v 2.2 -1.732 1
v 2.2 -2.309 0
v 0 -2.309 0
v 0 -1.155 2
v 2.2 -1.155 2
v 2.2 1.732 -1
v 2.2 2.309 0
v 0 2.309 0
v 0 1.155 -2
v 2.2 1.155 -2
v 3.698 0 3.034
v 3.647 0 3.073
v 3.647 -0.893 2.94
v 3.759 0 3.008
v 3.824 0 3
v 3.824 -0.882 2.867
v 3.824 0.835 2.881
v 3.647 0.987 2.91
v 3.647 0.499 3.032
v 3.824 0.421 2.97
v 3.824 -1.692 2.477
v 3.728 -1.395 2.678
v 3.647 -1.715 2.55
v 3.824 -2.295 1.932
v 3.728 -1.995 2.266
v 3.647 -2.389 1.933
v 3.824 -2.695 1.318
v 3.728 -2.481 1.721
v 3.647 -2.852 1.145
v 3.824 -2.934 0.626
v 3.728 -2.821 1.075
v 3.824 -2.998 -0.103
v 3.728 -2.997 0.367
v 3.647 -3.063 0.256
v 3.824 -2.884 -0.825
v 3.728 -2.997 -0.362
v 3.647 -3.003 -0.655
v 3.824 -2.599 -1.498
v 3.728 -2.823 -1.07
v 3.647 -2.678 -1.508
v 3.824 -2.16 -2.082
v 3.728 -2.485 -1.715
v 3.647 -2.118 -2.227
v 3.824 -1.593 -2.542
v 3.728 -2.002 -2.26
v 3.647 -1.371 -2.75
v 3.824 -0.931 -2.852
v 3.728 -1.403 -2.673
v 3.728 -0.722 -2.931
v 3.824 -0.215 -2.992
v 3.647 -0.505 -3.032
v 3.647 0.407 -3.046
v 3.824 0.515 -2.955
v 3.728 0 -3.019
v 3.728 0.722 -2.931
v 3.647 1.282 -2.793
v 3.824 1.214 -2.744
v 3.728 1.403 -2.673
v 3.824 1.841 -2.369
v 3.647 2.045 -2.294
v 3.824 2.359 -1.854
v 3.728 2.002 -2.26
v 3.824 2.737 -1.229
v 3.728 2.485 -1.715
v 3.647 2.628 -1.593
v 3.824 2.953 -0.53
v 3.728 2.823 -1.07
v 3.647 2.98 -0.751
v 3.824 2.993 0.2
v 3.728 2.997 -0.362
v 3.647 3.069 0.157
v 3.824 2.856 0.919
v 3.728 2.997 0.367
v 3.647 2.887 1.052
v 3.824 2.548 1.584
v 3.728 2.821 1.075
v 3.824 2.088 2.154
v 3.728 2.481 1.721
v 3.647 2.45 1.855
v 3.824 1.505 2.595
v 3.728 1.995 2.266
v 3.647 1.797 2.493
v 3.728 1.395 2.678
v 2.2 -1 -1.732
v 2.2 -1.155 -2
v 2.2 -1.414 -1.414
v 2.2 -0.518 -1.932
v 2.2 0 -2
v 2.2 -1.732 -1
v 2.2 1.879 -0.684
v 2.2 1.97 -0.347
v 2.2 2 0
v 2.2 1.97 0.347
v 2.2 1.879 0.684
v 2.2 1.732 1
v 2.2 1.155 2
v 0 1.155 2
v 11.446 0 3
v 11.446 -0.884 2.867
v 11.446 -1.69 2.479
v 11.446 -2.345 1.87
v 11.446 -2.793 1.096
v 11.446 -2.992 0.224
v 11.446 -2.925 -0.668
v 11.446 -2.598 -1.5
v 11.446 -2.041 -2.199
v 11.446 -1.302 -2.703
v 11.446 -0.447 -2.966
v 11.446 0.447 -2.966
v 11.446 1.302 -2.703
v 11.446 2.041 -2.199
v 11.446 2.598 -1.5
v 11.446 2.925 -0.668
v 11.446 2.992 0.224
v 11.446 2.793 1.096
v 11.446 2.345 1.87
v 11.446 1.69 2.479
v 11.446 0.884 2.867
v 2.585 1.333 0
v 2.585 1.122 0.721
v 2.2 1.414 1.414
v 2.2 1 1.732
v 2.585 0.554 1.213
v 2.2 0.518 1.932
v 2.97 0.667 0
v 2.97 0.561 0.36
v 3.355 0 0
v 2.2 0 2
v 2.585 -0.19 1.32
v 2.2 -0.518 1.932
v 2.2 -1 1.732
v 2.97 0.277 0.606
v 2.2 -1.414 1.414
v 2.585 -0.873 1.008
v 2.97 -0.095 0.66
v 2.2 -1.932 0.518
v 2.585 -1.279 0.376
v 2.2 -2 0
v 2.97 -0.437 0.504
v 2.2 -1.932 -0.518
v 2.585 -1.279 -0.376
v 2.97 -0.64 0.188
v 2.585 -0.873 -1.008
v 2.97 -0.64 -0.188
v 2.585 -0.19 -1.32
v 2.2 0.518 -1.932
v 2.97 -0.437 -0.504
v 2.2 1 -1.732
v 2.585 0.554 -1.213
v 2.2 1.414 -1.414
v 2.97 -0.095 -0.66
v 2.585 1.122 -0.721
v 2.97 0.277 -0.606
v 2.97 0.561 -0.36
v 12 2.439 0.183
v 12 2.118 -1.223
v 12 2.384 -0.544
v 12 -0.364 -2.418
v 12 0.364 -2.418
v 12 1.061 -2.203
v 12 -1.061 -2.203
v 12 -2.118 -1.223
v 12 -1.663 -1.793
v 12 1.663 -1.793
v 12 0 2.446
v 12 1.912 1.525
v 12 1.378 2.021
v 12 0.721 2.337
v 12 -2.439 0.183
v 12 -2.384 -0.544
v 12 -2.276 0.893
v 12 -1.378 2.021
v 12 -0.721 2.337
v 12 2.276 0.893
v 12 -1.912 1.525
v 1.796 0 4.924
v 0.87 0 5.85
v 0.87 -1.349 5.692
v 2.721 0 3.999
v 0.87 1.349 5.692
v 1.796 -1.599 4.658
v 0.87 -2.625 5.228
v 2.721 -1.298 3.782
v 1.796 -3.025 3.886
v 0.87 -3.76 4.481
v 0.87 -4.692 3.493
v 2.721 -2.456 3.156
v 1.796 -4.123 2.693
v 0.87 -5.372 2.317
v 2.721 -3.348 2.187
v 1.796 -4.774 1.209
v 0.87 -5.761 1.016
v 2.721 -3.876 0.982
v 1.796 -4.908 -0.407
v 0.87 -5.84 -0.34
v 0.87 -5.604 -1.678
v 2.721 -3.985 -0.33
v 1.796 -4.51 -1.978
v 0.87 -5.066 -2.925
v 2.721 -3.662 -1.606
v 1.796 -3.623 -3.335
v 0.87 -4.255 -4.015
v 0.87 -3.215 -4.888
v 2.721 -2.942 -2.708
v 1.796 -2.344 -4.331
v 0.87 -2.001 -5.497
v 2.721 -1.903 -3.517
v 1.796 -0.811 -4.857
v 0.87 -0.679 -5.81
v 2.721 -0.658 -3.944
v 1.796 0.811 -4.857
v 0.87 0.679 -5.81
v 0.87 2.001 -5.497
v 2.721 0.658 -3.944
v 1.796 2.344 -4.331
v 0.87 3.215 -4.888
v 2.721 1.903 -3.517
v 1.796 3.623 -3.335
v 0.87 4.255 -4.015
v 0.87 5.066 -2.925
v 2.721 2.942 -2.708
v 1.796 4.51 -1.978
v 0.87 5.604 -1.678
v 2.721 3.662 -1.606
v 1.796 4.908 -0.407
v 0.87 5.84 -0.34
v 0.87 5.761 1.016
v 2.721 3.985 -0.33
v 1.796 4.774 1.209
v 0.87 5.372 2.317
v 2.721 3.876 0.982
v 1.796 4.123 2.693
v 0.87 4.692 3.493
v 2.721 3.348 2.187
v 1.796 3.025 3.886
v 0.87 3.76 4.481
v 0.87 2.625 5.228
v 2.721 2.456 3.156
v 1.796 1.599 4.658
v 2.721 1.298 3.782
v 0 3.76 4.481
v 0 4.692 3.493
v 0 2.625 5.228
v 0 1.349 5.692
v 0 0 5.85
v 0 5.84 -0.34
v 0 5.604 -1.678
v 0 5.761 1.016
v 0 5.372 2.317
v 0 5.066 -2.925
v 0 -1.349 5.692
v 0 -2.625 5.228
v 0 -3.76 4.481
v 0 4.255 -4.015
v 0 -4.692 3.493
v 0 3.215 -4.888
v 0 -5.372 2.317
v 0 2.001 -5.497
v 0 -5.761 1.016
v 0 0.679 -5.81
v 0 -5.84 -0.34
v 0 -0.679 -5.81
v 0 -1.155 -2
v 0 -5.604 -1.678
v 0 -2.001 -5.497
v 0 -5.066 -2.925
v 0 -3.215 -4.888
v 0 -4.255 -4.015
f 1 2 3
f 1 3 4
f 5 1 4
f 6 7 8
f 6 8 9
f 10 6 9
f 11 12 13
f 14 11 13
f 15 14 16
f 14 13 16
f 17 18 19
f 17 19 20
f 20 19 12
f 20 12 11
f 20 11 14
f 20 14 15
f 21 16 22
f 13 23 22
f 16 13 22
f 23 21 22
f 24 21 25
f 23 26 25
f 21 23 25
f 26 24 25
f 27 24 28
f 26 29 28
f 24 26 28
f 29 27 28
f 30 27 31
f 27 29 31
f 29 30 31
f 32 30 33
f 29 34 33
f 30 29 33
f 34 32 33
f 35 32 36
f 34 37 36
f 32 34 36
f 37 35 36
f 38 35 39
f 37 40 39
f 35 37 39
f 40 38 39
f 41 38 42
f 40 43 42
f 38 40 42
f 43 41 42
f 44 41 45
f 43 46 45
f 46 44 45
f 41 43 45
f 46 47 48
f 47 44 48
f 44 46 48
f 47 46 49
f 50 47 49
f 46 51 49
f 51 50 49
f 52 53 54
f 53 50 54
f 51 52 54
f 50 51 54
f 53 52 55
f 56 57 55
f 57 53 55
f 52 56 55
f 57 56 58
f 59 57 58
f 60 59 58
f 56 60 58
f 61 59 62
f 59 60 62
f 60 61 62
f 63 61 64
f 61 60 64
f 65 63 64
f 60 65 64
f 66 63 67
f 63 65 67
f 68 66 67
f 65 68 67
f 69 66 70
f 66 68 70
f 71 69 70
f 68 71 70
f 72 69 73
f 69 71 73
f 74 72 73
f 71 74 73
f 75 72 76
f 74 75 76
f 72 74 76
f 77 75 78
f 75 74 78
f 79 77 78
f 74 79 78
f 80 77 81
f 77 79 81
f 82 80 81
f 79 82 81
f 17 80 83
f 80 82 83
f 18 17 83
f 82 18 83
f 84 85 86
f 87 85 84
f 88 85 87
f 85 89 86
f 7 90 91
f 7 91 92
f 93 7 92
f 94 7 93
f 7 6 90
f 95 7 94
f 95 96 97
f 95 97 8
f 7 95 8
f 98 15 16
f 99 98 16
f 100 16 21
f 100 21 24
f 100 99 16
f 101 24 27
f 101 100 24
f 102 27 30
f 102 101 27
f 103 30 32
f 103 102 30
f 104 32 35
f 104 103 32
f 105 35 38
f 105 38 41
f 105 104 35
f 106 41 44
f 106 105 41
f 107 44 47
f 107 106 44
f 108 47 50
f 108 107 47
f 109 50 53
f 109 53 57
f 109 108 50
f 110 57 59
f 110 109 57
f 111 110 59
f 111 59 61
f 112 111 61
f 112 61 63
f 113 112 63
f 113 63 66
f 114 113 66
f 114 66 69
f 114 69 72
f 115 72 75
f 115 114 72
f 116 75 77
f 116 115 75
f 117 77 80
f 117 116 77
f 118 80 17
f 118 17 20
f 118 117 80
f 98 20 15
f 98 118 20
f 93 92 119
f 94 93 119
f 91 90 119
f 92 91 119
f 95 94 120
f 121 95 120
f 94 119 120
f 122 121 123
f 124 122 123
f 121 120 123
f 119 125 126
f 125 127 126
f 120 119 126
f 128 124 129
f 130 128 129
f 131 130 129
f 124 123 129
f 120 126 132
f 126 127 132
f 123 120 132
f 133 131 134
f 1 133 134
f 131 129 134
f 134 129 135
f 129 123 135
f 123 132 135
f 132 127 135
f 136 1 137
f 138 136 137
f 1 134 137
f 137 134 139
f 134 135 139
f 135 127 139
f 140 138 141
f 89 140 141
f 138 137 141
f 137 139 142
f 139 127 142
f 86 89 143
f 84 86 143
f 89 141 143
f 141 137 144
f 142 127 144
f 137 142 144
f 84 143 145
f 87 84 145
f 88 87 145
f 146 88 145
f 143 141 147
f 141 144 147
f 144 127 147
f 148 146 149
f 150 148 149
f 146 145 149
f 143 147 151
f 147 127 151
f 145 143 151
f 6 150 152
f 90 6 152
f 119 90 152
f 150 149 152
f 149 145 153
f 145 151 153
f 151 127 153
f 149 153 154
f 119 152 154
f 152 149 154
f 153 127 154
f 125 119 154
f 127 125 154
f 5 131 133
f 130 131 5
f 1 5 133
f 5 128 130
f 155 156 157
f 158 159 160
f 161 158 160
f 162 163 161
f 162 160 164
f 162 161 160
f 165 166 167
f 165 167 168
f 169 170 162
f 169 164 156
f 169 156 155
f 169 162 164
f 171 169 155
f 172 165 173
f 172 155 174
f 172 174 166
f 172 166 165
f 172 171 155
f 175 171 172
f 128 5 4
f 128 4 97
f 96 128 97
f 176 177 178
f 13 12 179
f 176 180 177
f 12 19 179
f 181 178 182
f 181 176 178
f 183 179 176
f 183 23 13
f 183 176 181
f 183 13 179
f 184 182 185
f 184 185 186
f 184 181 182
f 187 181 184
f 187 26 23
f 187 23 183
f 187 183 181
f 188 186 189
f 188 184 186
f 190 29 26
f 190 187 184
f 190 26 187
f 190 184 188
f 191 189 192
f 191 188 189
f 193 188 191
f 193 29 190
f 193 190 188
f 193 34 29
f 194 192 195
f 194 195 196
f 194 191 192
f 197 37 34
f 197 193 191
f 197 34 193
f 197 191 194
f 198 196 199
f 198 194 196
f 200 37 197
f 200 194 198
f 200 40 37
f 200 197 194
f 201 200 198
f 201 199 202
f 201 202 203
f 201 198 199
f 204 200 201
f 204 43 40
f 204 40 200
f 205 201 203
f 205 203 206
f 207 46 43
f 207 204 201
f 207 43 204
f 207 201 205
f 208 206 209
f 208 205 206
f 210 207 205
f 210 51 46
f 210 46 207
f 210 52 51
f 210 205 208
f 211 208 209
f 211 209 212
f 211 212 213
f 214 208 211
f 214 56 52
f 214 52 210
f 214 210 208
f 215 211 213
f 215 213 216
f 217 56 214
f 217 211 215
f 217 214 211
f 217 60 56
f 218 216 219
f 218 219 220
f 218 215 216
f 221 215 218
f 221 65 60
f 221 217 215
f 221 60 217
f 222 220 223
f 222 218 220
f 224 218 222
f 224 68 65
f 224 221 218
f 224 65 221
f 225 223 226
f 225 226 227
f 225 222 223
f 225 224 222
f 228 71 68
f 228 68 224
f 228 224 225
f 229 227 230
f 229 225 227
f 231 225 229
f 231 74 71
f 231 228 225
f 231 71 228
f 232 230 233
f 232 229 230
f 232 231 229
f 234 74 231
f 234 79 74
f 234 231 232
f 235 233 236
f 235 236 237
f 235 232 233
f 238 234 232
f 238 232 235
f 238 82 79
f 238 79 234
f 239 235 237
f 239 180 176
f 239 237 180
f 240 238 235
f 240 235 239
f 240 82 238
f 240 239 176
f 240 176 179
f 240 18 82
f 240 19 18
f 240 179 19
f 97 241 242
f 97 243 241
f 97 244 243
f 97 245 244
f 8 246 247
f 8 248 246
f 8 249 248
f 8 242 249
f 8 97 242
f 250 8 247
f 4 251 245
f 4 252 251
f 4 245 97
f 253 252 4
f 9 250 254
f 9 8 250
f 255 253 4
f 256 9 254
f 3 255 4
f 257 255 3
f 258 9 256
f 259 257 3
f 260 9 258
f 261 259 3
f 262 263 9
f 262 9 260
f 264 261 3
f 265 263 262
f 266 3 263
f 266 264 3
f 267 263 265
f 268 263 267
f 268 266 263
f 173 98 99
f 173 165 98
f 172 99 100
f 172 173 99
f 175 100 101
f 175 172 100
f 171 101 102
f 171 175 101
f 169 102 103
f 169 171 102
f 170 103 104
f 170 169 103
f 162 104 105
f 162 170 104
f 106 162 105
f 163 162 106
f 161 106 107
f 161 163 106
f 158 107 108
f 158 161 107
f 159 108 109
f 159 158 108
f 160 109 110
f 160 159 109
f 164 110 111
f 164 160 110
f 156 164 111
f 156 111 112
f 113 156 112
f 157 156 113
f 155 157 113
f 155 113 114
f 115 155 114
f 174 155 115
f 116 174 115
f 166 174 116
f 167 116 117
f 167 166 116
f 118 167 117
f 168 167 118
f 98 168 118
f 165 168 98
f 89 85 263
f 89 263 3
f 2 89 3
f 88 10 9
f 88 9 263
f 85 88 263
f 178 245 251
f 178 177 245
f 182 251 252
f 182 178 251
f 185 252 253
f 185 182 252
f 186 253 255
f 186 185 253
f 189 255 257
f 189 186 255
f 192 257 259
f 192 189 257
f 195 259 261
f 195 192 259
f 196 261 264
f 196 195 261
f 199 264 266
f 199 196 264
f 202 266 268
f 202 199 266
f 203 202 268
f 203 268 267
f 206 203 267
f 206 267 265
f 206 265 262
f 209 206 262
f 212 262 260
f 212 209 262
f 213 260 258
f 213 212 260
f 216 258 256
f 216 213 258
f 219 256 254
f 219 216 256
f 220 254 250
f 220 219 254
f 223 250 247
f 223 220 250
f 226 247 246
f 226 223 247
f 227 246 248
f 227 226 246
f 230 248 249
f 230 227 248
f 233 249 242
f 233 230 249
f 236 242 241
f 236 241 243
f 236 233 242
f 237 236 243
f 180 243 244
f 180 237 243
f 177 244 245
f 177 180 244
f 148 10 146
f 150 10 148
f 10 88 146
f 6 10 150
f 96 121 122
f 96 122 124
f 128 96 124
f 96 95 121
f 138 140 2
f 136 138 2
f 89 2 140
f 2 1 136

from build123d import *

# Parameters (mm, degrees)
FILLET1_R   = 0.25
HEX_START   = -2.2
HEX_2_DEPTH = 2.2


with BuildPart() as part:
    # BodySke → BaseBody (revolve)
    with BuildSketch(Plane.XY, mode=Mode.PRIVATE) as basebody_sk:
        Polygon((0, 0), (0, 5.85), (0.87, 5.85), (3.72, 3), (11.4455, 3), (12, 2.4455), (12, 0), align=None)
    revolve(basebody_sk.sketch.rotate(Axis((0, 0, 0), (1, 0, 0)), 90), axis=Axis((0, 0, 0), (1, 0, 0)))

    # Fillet1
    fillet1_edges = [part.edges().sort_by_distance(p)[0] for p in [
        (3.72, 0, -3),
    ]]
    fillet(fillet1_edges, radius=FILLET1_R)

    # Hex 2: read off the stored shape, not the designer's step
    # Hex 2 outline → Hex 2 (cut)
    with BuildSketch(Plane.ZY.offset(HEX_START)):
        Polygon((-2, -1.154700538), (0, -2.309401077), (2, -1.154700538), (2, 1.154700538), (0, 2.309401077), (-2, 1.154700538), align=None)
    extrude(amount=HEX_2_DEPTH, mode=Mode.SUBTRACT)

    # Hex 2 2 outline → Hex 2 2 (revolve, cut)
    with BuildSketch(Plane.YX):
        Polygon((2, 2.2), (0, 3.354700538), (0, 2.2), align=None)
    revolve(axis=Axis((0, 0, 0), (1, 0, 0)), mode=Mode.SUBTRACT)


solid = part.part
